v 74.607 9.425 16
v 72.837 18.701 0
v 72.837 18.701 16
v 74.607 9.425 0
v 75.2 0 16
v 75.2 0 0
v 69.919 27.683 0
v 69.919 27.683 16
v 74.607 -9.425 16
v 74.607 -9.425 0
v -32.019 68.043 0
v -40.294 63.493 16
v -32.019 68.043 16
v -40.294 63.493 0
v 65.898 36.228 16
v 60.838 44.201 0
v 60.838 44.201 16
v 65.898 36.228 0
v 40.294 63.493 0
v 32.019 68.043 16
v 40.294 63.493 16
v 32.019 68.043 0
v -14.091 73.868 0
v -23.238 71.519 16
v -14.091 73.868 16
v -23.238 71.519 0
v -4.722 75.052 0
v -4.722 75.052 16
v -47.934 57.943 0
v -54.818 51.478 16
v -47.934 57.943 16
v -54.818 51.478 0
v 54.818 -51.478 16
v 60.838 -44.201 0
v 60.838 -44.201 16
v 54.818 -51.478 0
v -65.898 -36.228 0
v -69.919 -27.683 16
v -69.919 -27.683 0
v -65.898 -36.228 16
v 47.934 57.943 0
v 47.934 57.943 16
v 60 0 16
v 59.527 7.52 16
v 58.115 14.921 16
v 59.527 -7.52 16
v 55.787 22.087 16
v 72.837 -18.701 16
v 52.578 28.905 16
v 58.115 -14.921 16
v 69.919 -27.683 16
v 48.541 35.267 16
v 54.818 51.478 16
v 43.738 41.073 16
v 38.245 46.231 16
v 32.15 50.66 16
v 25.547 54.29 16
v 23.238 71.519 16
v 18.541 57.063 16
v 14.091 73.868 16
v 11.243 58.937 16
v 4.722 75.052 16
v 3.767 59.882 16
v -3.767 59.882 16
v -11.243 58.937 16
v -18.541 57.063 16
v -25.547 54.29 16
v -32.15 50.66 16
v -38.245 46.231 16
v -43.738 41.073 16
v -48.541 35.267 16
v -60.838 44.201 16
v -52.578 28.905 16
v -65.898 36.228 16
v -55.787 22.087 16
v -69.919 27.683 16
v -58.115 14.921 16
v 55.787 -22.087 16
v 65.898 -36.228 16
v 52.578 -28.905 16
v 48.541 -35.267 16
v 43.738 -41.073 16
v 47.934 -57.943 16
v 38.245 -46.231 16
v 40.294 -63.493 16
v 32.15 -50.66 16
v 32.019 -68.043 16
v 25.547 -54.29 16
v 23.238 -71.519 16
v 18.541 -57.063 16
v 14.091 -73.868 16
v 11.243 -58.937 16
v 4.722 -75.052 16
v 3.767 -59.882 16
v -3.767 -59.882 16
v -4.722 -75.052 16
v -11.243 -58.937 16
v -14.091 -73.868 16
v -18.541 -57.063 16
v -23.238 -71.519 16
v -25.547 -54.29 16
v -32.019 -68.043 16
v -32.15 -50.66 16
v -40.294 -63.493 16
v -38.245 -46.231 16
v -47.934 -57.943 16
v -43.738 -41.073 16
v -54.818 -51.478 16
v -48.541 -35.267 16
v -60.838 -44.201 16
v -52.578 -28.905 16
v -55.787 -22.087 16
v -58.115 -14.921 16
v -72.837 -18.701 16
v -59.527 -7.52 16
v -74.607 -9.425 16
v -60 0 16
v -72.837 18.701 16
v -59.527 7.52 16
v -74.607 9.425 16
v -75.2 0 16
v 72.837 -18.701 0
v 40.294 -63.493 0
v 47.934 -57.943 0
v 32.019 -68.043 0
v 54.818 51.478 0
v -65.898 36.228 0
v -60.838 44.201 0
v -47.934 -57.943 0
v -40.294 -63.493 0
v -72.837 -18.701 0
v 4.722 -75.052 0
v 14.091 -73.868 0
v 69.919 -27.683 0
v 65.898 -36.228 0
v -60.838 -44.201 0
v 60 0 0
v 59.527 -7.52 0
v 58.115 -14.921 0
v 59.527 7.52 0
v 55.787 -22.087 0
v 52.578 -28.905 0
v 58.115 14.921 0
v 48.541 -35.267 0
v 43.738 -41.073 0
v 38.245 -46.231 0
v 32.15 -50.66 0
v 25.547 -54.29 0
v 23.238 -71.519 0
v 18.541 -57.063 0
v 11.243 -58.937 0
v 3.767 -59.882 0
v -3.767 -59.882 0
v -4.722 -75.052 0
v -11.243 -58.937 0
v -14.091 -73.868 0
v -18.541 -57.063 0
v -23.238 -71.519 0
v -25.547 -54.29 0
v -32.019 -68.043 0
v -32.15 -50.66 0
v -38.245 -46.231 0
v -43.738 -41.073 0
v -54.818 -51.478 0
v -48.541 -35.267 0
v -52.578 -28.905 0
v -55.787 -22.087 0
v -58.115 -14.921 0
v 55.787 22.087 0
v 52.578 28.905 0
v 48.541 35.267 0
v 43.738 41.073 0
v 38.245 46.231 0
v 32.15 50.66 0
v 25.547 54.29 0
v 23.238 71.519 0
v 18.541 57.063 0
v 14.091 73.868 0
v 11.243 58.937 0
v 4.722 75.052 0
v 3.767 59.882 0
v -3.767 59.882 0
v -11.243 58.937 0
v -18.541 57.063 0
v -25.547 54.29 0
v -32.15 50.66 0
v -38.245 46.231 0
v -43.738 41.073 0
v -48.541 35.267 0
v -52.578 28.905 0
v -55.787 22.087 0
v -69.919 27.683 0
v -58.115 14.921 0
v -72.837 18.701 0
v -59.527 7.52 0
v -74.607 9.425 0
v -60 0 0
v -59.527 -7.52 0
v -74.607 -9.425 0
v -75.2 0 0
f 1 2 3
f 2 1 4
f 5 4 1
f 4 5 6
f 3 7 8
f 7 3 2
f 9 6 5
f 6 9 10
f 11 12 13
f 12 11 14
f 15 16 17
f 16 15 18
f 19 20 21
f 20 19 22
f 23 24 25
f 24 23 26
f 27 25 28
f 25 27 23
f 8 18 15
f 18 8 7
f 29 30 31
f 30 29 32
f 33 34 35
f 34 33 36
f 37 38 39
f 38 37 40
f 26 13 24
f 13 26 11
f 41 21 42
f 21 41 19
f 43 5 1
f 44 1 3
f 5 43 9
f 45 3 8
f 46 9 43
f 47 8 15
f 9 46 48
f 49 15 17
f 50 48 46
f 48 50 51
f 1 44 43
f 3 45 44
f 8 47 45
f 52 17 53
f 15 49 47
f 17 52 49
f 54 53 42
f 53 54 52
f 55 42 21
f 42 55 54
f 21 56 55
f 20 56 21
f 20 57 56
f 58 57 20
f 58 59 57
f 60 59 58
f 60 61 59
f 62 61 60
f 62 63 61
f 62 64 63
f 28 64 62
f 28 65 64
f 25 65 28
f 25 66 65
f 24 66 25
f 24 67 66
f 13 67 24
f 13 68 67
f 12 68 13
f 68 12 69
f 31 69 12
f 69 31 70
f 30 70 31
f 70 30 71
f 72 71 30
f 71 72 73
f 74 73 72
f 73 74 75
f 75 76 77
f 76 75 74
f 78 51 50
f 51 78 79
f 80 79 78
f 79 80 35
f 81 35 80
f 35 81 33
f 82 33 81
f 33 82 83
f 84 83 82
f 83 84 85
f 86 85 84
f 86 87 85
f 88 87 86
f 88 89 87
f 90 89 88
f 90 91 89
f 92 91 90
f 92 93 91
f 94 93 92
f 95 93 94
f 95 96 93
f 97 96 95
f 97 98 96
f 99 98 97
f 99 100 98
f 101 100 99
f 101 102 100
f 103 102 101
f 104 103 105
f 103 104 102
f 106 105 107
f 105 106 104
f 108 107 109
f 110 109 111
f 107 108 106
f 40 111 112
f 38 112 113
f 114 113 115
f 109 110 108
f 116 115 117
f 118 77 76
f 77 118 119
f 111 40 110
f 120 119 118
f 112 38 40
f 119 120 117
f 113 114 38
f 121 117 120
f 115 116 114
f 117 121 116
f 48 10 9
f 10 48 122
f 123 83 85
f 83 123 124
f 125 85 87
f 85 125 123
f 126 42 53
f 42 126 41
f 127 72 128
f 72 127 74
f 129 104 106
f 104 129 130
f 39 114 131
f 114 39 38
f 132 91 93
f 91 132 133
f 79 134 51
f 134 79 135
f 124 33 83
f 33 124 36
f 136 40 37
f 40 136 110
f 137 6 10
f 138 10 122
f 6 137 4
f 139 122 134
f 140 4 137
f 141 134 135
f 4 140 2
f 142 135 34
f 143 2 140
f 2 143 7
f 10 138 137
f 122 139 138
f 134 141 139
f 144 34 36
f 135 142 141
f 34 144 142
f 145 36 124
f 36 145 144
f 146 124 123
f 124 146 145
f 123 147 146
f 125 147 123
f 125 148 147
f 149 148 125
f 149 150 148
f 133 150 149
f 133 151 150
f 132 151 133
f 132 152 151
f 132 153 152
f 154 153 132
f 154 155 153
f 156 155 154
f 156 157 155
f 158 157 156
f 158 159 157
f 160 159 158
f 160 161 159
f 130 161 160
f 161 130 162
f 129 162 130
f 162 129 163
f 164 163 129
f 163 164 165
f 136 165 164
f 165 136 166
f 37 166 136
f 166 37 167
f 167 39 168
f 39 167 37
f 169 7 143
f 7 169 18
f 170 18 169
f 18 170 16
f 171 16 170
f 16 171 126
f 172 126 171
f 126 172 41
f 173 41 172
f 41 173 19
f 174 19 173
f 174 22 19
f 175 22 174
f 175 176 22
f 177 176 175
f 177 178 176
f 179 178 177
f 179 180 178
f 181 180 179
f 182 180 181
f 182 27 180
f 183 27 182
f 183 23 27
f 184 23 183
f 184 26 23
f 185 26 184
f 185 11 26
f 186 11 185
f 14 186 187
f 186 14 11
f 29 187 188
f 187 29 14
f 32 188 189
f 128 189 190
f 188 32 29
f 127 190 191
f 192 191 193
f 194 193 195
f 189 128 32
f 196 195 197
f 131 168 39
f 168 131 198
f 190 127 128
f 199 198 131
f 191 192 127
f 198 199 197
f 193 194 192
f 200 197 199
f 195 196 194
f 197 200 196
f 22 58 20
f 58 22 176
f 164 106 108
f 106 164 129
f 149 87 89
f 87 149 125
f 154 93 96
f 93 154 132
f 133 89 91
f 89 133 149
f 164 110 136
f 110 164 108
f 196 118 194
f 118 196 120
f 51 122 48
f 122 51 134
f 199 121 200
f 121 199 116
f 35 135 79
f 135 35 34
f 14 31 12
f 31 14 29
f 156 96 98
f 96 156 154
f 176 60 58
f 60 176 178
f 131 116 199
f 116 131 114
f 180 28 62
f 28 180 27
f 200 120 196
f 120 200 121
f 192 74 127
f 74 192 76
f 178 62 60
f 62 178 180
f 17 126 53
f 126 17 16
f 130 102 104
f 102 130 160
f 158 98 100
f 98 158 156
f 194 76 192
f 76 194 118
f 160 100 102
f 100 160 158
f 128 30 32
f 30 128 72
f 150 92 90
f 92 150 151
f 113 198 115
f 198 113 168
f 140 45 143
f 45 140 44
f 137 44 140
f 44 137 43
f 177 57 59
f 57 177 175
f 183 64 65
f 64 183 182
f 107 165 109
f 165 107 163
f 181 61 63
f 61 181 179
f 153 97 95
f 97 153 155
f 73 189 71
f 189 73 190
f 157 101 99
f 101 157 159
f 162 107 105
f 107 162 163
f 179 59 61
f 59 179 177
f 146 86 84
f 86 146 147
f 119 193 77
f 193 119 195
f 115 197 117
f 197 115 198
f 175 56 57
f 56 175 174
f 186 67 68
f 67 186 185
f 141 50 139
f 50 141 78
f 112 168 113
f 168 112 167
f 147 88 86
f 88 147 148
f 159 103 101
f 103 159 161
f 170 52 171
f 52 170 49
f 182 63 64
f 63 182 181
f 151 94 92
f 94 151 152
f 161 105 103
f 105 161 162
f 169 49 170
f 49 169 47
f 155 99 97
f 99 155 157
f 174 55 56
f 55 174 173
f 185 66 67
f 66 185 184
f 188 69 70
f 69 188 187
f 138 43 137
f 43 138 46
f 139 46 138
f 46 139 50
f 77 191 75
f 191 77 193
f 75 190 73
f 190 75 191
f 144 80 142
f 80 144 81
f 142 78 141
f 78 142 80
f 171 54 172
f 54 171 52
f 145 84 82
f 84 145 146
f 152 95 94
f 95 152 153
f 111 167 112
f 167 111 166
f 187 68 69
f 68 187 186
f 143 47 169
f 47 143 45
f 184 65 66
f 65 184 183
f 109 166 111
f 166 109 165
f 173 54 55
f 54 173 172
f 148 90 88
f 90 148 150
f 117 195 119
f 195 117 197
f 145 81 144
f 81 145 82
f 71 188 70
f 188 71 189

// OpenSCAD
$fn = 50;


difference() {
	union() {
		cylinder(h = 16, r = 75.2000000000);
	}
	union() {
		cylinder(h = 16, r = 60.0000000000);
	}
}
